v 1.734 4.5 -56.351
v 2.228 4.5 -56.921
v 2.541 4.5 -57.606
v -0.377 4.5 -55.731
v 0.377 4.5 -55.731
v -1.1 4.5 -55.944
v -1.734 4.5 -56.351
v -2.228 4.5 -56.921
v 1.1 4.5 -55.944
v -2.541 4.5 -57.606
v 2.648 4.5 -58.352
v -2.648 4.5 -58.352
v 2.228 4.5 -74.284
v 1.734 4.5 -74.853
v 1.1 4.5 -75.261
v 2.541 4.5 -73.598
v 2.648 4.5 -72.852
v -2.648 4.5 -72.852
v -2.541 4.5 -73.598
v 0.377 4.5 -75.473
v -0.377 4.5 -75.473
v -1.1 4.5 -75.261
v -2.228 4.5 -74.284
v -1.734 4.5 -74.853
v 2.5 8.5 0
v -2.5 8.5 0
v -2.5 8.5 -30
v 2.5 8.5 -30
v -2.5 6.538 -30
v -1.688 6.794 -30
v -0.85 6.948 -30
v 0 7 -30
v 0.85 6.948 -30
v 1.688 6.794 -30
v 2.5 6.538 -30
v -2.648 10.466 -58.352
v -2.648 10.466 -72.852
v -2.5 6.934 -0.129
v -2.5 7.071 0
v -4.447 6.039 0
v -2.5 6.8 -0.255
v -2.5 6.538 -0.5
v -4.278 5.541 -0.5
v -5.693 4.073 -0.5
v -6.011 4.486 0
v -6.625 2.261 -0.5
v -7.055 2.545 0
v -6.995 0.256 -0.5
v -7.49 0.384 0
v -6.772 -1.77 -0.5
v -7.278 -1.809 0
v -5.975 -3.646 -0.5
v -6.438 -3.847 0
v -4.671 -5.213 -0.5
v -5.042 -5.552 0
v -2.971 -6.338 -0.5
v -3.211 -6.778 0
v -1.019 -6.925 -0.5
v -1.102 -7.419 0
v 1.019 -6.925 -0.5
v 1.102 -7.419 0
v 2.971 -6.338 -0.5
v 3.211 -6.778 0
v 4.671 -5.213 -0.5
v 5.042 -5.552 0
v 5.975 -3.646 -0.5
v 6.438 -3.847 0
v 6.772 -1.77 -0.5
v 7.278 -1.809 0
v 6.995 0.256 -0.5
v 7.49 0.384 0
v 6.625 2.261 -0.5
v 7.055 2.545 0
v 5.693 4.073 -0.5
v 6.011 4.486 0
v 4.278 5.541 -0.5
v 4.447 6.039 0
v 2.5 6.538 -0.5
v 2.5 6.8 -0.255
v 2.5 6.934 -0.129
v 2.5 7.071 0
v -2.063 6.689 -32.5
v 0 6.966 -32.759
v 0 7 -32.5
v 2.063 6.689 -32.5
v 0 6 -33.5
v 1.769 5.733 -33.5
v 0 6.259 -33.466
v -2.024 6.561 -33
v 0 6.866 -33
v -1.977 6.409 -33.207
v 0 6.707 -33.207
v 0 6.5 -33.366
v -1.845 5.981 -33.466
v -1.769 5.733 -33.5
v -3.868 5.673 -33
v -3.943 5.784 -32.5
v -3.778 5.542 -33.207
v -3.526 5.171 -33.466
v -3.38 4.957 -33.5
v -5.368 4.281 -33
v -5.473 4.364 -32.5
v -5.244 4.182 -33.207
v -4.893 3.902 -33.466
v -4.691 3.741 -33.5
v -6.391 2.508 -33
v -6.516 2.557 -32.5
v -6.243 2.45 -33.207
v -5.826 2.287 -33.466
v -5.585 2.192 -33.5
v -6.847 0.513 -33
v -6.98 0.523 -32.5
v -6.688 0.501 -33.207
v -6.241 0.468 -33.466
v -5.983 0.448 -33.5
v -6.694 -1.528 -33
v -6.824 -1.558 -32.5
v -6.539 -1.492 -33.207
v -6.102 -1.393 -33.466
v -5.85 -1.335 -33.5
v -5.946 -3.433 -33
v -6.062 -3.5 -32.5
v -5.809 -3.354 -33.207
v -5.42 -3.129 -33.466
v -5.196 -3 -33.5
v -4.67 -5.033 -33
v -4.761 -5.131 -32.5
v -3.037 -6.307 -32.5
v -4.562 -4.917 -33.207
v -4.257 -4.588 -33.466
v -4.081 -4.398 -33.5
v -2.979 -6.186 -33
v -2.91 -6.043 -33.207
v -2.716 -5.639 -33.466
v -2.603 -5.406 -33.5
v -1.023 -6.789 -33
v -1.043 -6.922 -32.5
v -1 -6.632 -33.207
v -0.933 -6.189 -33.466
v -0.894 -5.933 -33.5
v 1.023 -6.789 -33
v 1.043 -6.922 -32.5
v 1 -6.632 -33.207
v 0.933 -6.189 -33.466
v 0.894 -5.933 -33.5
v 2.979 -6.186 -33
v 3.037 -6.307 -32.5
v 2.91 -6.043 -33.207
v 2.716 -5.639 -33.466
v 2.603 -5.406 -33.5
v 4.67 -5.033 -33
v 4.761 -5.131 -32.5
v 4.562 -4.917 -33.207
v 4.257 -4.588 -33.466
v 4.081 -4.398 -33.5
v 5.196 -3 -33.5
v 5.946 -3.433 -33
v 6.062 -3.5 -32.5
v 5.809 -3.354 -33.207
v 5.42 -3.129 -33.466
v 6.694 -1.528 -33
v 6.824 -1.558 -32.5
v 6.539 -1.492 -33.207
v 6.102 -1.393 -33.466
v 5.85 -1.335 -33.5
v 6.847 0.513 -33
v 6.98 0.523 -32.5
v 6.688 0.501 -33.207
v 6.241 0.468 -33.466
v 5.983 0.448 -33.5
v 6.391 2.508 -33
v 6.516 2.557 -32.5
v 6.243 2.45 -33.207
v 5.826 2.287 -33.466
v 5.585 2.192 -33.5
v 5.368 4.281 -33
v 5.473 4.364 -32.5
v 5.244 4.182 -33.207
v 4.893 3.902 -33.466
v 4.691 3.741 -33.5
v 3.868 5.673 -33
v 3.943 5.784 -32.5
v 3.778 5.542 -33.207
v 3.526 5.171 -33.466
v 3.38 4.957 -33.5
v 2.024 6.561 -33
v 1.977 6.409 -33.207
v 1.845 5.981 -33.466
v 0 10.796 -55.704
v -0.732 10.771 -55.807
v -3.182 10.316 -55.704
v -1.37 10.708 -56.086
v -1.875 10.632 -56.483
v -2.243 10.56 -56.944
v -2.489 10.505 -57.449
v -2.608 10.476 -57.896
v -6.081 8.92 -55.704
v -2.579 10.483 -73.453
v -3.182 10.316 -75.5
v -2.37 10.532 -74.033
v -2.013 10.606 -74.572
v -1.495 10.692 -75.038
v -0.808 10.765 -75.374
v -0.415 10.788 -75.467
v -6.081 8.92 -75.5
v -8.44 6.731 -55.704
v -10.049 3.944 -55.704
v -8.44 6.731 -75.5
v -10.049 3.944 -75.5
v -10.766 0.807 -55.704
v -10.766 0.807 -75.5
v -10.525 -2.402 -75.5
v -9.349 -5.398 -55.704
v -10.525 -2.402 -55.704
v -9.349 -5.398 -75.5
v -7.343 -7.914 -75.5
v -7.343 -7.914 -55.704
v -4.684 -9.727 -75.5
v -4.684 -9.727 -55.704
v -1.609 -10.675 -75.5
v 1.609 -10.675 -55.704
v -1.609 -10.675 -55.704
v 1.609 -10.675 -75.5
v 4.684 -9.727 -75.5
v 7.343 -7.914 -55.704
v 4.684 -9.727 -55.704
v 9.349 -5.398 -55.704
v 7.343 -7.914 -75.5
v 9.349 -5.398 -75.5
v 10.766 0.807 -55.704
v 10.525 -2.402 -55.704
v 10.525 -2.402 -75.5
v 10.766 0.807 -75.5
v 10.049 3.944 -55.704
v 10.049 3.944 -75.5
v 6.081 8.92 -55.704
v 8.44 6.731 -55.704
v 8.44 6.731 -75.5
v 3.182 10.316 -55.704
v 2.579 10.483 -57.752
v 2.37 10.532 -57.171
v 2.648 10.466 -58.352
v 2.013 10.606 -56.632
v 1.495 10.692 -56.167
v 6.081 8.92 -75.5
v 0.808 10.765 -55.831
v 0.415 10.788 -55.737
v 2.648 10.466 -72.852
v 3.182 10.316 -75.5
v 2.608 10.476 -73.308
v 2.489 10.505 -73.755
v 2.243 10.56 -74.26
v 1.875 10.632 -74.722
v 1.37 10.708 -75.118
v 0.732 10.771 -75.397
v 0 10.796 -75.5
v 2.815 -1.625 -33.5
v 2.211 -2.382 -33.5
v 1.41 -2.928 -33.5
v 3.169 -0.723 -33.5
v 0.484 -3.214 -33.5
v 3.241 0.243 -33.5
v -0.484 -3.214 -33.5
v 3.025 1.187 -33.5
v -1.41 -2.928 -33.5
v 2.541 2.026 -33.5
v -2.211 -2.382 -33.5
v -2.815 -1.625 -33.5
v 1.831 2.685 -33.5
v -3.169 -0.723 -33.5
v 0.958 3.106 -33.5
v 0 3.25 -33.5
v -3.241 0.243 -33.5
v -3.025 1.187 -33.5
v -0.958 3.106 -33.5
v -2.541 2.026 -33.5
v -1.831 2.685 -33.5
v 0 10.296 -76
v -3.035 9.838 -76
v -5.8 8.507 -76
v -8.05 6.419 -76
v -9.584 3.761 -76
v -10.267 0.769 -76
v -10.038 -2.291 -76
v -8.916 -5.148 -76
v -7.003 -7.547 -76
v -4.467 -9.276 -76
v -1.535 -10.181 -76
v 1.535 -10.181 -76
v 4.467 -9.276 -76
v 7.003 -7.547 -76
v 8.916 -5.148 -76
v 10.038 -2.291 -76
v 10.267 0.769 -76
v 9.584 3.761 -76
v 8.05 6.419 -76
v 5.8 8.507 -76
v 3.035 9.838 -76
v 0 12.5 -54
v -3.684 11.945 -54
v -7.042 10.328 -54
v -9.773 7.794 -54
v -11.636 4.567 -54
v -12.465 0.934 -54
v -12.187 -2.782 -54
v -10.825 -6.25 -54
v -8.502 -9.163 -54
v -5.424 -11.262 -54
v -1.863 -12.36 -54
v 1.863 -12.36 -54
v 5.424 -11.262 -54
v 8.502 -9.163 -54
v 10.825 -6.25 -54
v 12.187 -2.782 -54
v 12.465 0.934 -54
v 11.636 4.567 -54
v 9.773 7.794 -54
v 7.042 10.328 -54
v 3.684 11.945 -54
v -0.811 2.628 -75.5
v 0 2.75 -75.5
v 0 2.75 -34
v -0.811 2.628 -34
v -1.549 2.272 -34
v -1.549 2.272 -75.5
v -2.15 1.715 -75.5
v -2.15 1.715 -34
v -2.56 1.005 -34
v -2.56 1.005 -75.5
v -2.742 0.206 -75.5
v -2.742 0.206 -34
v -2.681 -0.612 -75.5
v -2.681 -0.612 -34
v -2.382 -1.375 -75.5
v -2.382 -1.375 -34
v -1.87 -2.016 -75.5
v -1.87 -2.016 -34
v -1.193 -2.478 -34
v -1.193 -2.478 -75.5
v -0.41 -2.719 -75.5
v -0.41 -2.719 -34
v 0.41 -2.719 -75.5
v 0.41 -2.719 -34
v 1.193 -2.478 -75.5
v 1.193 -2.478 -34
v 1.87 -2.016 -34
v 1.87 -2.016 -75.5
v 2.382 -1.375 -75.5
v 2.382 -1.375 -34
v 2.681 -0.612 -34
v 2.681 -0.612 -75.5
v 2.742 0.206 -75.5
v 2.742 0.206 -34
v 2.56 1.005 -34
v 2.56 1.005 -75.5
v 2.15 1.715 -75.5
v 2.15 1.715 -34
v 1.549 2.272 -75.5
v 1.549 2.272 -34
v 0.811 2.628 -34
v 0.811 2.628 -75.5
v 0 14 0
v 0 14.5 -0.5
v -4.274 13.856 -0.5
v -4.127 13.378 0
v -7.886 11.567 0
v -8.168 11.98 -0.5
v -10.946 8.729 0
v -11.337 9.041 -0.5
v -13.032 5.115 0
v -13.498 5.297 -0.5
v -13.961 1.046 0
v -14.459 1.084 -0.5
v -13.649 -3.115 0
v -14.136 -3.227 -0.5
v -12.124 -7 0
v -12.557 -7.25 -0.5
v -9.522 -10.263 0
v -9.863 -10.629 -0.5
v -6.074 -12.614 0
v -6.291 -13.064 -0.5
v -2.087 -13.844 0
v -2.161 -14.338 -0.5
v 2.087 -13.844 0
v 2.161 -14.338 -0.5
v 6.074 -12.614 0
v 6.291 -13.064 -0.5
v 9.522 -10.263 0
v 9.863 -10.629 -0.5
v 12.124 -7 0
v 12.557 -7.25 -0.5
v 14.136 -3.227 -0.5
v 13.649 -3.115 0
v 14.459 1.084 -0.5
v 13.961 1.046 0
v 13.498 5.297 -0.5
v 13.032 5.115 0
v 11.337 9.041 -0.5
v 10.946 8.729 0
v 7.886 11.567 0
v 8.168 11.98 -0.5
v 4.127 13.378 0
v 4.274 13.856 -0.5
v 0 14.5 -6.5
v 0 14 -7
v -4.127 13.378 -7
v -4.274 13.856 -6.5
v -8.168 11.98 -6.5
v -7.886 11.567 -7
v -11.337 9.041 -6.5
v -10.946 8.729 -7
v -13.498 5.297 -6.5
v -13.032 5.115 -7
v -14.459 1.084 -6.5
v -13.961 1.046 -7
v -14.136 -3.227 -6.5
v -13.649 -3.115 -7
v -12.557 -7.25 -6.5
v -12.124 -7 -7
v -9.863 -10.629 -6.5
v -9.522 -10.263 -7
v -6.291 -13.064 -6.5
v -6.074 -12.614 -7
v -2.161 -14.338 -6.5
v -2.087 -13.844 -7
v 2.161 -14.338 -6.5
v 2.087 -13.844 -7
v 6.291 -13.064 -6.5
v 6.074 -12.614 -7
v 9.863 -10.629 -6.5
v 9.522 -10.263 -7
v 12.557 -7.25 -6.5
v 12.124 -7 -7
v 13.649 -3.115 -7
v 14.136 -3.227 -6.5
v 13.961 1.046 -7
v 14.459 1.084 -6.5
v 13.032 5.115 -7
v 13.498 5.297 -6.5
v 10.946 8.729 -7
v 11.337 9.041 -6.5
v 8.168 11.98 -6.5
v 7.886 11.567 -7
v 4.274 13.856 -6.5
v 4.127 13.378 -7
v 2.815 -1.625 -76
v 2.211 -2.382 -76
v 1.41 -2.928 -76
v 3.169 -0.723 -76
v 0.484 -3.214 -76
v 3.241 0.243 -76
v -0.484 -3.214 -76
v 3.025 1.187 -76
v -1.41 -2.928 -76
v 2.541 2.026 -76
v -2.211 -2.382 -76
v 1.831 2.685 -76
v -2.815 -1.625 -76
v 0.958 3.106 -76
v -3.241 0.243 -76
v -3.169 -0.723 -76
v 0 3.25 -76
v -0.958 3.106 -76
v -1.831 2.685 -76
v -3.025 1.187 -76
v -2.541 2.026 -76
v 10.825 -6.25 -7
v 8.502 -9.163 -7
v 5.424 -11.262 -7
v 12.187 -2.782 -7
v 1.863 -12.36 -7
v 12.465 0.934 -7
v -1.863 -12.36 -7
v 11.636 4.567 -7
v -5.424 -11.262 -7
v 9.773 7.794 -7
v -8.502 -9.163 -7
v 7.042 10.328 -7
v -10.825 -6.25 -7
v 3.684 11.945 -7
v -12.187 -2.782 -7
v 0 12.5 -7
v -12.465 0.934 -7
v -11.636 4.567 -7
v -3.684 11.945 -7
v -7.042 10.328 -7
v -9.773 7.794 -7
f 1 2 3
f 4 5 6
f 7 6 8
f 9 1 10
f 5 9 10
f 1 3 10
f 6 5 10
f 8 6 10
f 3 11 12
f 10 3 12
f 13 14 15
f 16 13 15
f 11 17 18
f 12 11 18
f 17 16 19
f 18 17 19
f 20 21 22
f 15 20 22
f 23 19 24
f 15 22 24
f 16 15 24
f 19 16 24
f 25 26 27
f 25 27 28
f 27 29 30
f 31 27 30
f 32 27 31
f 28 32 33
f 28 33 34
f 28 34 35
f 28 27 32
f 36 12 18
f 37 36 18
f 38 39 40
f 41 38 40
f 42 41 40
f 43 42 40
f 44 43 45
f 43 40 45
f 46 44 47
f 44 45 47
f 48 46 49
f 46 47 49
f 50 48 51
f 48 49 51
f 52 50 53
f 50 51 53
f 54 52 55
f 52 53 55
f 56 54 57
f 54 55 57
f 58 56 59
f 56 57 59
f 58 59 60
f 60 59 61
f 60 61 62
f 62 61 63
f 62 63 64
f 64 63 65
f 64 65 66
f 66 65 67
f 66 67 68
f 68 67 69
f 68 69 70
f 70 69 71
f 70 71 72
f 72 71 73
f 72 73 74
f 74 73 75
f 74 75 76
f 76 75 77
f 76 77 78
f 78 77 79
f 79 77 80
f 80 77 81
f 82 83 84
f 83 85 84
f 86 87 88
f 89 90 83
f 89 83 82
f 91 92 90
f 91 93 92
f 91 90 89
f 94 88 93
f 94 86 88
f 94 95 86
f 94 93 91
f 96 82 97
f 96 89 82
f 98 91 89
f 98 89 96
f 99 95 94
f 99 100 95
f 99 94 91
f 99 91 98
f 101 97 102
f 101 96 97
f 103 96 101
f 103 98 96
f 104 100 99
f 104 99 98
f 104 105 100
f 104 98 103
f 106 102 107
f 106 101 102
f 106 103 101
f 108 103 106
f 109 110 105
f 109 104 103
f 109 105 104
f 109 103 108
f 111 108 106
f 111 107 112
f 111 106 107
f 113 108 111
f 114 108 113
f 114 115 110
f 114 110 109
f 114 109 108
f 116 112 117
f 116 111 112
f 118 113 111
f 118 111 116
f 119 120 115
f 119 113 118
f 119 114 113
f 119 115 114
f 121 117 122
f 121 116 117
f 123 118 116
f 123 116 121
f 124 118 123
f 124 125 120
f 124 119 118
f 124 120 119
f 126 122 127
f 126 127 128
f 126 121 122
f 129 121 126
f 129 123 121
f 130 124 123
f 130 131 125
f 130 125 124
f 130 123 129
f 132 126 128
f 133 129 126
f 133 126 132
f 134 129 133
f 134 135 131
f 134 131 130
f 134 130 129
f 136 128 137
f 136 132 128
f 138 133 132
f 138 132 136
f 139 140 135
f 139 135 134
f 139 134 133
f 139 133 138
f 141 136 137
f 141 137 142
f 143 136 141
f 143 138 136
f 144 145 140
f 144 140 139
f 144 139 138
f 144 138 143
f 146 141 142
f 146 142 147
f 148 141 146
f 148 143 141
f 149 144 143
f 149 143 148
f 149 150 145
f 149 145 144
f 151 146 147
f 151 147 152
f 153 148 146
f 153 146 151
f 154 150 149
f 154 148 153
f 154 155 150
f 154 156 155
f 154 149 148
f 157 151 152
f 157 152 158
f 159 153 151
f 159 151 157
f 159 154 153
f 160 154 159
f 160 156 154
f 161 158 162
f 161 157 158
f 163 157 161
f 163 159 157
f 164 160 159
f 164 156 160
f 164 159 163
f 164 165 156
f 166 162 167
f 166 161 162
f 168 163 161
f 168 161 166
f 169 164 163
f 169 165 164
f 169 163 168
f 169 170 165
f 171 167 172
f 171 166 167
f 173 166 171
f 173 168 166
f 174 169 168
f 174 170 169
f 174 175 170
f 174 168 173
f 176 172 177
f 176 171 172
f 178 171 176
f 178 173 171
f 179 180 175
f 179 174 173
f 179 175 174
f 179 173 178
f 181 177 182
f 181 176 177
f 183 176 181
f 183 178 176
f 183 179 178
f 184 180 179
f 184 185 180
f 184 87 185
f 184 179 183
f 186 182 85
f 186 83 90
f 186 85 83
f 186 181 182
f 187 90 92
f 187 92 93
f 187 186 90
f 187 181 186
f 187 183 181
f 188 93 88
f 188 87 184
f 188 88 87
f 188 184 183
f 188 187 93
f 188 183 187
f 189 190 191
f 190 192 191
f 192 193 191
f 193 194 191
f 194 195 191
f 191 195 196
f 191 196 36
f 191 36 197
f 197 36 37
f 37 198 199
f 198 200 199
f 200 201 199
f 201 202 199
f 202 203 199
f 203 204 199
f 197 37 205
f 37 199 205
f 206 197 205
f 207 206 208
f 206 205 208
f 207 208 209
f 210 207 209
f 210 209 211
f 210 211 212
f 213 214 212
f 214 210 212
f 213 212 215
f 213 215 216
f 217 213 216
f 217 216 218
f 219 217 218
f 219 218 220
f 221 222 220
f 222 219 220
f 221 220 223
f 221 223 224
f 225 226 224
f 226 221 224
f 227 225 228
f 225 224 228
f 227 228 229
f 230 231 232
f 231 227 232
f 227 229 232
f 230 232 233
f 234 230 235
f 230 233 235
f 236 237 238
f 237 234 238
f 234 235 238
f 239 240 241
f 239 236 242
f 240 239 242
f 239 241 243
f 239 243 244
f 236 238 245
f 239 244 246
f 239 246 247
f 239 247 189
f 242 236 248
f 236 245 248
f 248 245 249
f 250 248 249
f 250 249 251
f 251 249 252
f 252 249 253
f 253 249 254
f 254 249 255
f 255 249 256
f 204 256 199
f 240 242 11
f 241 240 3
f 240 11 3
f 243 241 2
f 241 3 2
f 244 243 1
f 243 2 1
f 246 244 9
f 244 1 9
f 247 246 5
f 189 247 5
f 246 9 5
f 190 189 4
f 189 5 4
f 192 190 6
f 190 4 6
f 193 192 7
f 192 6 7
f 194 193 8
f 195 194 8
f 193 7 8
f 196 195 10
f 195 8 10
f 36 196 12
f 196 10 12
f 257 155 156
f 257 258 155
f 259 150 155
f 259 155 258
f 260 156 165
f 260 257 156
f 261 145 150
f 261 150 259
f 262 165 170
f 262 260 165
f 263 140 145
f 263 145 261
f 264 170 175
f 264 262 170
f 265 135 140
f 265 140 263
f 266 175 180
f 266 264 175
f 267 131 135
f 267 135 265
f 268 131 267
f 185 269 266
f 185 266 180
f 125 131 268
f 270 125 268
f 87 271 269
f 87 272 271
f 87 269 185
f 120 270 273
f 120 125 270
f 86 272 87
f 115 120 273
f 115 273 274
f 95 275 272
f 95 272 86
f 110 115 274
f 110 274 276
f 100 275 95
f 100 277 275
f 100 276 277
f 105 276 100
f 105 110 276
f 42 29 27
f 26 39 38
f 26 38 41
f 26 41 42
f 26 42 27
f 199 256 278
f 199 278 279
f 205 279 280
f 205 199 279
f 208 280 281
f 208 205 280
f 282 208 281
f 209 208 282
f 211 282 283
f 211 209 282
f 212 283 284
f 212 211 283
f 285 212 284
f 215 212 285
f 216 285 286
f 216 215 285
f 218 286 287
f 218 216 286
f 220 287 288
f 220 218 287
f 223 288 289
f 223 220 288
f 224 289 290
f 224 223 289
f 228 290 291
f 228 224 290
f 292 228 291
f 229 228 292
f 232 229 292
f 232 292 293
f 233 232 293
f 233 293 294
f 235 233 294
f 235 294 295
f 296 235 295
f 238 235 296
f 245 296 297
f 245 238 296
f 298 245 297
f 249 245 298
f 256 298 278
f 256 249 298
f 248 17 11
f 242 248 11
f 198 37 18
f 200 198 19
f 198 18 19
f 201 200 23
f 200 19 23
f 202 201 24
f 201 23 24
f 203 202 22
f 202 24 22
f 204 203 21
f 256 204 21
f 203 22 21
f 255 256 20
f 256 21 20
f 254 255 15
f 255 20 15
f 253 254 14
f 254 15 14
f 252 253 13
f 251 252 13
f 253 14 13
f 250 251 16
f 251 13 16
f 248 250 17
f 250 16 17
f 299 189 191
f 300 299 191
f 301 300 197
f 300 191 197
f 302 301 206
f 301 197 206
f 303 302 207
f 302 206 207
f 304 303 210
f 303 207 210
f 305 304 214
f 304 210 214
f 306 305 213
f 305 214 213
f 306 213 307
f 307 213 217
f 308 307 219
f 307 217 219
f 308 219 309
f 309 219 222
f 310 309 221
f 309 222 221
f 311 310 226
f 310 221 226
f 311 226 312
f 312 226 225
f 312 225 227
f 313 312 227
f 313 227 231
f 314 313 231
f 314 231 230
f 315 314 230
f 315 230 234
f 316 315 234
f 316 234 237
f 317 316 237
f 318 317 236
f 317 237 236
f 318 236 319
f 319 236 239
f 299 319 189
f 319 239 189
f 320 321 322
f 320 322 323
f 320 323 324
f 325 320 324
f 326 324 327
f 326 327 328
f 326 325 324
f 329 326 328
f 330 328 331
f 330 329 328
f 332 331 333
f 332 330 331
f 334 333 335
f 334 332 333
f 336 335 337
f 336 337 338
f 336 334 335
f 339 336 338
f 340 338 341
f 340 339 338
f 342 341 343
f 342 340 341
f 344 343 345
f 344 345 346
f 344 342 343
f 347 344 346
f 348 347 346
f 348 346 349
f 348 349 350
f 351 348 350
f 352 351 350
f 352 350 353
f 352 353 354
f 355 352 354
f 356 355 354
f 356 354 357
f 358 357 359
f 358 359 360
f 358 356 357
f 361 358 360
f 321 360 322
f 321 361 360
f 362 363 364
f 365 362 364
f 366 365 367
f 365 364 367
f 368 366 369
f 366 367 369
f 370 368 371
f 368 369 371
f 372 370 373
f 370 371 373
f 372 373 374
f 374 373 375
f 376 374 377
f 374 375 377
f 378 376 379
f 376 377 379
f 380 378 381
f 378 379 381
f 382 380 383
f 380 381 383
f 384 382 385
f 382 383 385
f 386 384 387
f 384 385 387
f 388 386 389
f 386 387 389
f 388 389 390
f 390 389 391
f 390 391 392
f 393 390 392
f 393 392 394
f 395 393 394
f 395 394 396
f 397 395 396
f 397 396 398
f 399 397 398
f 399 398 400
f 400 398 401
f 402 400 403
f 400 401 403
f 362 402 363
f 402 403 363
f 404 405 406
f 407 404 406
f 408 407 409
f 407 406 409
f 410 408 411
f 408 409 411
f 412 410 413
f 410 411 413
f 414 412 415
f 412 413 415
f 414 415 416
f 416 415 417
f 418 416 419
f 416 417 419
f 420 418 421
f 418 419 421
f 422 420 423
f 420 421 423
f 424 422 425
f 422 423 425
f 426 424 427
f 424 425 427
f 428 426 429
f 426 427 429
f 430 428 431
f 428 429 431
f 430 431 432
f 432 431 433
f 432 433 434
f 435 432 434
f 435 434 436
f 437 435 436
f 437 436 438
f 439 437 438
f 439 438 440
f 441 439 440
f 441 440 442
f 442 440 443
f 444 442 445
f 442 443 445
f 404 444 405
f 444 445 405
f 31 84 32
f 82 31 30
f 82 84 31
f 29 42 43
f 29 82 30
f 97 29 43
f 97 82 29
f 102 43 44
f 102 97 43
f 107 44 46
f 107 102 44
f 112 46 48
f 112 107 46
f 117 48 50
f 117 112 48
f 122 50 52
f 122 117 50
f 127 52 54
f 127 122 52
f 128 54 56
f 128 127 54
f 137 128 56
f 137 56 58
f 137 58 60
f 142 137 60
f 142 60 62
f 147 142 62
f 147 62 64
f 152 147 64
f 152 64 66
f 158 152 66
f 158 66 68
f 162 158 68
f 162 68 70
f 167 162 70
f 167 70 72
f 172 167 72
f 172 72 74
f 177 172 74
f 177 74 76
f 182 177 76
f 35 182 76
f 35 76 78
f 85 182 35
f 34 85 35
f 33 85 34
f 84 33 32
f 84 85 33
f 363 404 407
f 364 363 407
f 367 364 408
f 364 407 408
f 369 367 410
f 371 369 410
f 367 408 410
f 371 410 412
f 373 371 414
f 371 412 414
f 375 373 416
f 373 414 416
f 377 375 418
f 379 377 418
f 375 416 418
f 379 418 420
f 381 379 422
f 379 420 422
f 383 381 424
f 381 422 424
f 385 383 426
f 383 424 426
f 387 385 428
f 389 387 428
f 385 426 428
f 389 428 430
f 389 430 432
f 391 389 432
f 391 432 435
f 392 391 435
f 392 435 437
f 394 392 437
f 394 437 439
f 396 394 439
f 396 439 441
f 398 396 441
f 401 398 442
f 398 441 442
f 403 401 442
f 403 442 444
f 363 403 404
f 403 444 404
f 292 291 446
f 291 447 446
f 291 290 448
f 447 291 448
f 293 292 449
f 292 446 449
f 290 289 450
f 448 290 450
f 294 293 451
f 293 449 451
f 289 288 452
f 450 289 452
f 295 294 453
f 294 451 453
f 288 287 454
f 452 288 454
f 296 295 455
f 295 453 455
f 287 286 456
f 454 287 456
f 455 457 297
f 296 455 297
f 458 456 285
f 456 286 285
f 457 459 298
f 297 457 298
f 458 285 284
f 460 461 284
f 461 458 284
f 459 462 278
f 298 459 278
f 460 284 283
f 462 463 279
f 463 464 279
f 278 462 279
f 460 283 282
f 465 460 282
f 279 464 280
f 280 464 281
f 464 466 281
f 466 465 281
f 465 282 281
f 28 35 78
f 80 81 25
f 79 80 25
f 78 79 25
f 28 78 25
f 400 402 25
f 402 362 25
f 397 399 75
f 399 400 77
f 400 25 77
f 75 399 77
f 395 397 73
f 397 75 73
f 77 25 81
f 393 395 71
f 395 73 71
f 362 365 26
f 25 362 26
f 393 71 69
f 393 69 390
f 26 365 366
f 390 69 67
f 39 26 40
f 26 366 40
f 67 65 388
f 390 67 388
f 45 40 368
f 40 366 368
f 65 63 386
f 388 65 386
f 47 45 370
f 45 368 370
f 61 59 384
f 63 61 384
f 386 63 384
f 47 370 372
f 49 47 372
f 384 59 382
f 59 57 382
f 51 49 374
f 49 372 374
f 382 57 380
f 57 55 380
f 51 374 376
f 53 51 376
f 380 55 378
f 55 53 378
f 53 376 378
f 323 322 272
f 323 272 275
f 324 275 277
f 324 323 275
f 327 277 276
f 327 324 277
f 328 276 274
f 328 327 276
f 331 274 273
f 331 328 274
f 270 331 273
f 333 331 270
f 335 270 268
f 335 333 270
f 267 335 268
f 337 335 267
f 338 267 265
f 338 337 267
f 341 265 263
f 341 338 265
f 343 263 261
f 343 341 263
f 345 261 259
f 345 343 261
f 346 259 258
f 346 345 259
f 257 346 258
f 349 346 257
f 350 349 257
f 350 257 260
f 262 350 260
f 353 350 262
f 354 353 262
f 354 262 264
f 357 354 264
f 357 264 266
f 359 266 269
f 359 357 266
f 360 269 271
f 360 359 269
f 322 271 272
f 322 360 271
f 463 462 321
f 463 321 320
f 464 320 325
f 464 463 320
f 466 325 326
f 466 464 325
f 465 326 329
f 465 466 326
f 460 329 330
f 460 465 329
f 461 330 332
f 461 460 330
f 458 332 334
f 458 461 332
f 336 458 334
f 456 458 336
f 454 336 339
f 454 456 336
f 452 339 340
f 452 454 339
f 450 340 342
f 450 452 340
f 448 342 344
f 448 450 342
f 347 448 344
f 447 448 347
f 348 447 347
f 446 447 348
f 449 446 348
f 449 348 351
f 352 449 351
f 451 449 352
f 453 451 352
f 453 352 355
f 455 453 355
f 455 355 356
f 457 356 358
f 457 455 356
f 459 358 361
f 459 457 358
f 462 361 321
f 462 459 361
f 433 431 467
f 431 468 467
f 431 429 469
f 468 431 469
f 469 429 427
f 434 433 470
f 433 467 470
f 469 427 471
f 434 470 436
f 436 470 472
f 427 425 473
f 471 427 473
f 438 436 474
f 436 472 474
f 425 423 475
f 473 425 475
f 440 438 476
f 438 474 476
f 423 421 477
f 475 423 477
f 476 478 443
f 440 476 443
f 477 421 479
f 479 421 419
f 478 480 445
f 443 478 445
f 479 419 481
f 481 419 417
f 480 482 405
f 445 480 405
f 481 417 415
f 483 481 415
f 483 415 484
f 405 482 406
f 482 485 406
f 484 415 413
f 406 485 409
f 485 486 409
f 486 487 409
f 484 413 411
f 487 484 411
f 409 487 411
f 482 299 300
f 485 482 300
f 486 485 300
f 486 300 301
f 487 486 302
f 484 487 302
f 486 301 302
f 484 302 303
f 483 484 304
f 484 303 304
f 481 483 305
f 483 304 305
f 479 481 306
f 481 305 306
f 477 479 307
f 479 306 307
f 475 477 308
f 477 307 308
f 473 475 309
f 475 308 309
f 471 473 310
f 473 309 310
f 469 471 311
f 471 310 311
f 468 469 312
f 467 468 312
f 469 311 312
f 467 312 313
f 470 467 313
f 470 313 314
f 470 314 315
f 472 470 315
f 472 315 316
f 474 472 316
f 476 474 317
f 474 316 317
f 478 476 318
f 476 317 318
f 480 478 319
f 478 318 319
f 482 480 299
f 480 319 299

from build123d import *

# Parameters (mm, degrees)
FILLET_1_R          = 1
CHAMFER_1_SIZE      = 0.5
CHAMFER_2_SIZE      = 2
SKETCH_4_W          = 5
SKETCH_4_H          = 8.5
CUT_EXTRUDE_1_DEPTH = 30
CUT_EXTRUDE_2_DEPTH = 80.669630349


with BuildPart() as part:
    # 草图1 → 旋转1 (revolve)
    with BuildSketch(Plane(origin=(0, 0, 0), x_dir=(0, 0, -1), z_dir=(1, 0, 0))):
        Polygon((0, 0), (0, 14.5), (7, 14.5), (7, 12.5), (56, 12.5), (56, 10.795768266), (76, 10.795768266), (76, 0), align=None)
    revolve(axis=Axis((0, 0, -76), (0, 0, 1)))

    # 草图3 → 切除-旋转1 (revolve, cut)
    with BuildSketch(Plane(origin=(0, 0, 0), x_dir=(0, 0, -1), z_dir=(1, 0, 0))):
        Polygon((0, 0), (0, 7), (33.5, 7), (33.5, 2.75), (76, 2.75), (76, 0), align=None)
    revolve(axis=Axis((0, 0, -76), (0, 0, 1)), mode=Mode.SUBTRACT)

    # 圆角1
    fillet_1_edges = [part.edges().sort_by_distance(p)[0] for p in [
        (0, -7, -33.5),
    ]]
    fillet(fillet_1_edges, radius=FILLET_1_R)

    # 倒角1
    chamfer_1_edges = [part.edges().sort_by_distance(p)[0] for p in [
        (0, -7, 0),
        (0, -2.75, -33.5),
        (0, -2.75, -76),
        (0, -10.795768266, -76),
        (0, -14.5, -7),
        (0, -14.5, 0),
    ]]
    chamfer(chamfer_1_edges, length=CHAMFER_1_SIZE)

    # 倒角2
    # the kernel refuses this chamfer: 2 mm, written as the material it takes off along each edge
    with BuildSketch(Plane(origin=(0, 0, -56), x_dir=(0, 1, 0), z_dir=(1, 0, 0))) as chamfer_2_piece_1_section:
        Polygon((12.5, CHAMFER_2_SIZE), (12.5 - CHAMFER_2_SIZE, 0), (12.5, 0), align=None)
    chamfer_2_piece_1 = revolve(axis=Axis((0, 0, -56), (0, 0, 1)), mode=Mode.PRIVATE)
    chamfer_2_piece_1 = chamfer_2_piece_1 - Plane(origin=(0, 0, -54.862135047), x_dir=(0, 1, 0), z_dir=(0, 0, -1)) * Cylinder(10.795768266, 50, mode=Mode.PRIVATE)
    add(chamfer_2_piece_1, mode=Mode.SUBTRACT)

    # 草图4 → 切除-拉伸1 (cut)
    with BuildSketch(Plane.XY):
        with Locations((0, 4.25)):
            Rectangle(SKETCH_4_W, SKETCH_4_H)
    extrude(amount=-CUT_EXTRUDE_1_DEPTH, mode=Mode.SUBTRACT)

    # 草图5 → 切除-拉伸2 (cut, through all)
    with BuildSketch(Plane(origin=(0, 4.5, 0), x_dir=(1, 0, 0), z_dir=(0, 1, 0))):
        with BuildLine():
            Line((2.647884133, 72.852115867), (2.647884133, 58.352115867))
            ThreePointArc((2.647884133, 58.352115867), (0, 55.704231734), (-2.647884133, 58.352115867))
            Line((-2.647884133, 58.352115867), (-2.647884133, 72.852115867))
            ThreePointArc((-2.647884133, 72.852115867), (0, 75.5), (2.647884133, 72.852115867))
        make_face()
    extrude(amount=CUT_EXTRUDE_2_DEPTH, mode=Mode.SUBTRACT)


solid = part.part
